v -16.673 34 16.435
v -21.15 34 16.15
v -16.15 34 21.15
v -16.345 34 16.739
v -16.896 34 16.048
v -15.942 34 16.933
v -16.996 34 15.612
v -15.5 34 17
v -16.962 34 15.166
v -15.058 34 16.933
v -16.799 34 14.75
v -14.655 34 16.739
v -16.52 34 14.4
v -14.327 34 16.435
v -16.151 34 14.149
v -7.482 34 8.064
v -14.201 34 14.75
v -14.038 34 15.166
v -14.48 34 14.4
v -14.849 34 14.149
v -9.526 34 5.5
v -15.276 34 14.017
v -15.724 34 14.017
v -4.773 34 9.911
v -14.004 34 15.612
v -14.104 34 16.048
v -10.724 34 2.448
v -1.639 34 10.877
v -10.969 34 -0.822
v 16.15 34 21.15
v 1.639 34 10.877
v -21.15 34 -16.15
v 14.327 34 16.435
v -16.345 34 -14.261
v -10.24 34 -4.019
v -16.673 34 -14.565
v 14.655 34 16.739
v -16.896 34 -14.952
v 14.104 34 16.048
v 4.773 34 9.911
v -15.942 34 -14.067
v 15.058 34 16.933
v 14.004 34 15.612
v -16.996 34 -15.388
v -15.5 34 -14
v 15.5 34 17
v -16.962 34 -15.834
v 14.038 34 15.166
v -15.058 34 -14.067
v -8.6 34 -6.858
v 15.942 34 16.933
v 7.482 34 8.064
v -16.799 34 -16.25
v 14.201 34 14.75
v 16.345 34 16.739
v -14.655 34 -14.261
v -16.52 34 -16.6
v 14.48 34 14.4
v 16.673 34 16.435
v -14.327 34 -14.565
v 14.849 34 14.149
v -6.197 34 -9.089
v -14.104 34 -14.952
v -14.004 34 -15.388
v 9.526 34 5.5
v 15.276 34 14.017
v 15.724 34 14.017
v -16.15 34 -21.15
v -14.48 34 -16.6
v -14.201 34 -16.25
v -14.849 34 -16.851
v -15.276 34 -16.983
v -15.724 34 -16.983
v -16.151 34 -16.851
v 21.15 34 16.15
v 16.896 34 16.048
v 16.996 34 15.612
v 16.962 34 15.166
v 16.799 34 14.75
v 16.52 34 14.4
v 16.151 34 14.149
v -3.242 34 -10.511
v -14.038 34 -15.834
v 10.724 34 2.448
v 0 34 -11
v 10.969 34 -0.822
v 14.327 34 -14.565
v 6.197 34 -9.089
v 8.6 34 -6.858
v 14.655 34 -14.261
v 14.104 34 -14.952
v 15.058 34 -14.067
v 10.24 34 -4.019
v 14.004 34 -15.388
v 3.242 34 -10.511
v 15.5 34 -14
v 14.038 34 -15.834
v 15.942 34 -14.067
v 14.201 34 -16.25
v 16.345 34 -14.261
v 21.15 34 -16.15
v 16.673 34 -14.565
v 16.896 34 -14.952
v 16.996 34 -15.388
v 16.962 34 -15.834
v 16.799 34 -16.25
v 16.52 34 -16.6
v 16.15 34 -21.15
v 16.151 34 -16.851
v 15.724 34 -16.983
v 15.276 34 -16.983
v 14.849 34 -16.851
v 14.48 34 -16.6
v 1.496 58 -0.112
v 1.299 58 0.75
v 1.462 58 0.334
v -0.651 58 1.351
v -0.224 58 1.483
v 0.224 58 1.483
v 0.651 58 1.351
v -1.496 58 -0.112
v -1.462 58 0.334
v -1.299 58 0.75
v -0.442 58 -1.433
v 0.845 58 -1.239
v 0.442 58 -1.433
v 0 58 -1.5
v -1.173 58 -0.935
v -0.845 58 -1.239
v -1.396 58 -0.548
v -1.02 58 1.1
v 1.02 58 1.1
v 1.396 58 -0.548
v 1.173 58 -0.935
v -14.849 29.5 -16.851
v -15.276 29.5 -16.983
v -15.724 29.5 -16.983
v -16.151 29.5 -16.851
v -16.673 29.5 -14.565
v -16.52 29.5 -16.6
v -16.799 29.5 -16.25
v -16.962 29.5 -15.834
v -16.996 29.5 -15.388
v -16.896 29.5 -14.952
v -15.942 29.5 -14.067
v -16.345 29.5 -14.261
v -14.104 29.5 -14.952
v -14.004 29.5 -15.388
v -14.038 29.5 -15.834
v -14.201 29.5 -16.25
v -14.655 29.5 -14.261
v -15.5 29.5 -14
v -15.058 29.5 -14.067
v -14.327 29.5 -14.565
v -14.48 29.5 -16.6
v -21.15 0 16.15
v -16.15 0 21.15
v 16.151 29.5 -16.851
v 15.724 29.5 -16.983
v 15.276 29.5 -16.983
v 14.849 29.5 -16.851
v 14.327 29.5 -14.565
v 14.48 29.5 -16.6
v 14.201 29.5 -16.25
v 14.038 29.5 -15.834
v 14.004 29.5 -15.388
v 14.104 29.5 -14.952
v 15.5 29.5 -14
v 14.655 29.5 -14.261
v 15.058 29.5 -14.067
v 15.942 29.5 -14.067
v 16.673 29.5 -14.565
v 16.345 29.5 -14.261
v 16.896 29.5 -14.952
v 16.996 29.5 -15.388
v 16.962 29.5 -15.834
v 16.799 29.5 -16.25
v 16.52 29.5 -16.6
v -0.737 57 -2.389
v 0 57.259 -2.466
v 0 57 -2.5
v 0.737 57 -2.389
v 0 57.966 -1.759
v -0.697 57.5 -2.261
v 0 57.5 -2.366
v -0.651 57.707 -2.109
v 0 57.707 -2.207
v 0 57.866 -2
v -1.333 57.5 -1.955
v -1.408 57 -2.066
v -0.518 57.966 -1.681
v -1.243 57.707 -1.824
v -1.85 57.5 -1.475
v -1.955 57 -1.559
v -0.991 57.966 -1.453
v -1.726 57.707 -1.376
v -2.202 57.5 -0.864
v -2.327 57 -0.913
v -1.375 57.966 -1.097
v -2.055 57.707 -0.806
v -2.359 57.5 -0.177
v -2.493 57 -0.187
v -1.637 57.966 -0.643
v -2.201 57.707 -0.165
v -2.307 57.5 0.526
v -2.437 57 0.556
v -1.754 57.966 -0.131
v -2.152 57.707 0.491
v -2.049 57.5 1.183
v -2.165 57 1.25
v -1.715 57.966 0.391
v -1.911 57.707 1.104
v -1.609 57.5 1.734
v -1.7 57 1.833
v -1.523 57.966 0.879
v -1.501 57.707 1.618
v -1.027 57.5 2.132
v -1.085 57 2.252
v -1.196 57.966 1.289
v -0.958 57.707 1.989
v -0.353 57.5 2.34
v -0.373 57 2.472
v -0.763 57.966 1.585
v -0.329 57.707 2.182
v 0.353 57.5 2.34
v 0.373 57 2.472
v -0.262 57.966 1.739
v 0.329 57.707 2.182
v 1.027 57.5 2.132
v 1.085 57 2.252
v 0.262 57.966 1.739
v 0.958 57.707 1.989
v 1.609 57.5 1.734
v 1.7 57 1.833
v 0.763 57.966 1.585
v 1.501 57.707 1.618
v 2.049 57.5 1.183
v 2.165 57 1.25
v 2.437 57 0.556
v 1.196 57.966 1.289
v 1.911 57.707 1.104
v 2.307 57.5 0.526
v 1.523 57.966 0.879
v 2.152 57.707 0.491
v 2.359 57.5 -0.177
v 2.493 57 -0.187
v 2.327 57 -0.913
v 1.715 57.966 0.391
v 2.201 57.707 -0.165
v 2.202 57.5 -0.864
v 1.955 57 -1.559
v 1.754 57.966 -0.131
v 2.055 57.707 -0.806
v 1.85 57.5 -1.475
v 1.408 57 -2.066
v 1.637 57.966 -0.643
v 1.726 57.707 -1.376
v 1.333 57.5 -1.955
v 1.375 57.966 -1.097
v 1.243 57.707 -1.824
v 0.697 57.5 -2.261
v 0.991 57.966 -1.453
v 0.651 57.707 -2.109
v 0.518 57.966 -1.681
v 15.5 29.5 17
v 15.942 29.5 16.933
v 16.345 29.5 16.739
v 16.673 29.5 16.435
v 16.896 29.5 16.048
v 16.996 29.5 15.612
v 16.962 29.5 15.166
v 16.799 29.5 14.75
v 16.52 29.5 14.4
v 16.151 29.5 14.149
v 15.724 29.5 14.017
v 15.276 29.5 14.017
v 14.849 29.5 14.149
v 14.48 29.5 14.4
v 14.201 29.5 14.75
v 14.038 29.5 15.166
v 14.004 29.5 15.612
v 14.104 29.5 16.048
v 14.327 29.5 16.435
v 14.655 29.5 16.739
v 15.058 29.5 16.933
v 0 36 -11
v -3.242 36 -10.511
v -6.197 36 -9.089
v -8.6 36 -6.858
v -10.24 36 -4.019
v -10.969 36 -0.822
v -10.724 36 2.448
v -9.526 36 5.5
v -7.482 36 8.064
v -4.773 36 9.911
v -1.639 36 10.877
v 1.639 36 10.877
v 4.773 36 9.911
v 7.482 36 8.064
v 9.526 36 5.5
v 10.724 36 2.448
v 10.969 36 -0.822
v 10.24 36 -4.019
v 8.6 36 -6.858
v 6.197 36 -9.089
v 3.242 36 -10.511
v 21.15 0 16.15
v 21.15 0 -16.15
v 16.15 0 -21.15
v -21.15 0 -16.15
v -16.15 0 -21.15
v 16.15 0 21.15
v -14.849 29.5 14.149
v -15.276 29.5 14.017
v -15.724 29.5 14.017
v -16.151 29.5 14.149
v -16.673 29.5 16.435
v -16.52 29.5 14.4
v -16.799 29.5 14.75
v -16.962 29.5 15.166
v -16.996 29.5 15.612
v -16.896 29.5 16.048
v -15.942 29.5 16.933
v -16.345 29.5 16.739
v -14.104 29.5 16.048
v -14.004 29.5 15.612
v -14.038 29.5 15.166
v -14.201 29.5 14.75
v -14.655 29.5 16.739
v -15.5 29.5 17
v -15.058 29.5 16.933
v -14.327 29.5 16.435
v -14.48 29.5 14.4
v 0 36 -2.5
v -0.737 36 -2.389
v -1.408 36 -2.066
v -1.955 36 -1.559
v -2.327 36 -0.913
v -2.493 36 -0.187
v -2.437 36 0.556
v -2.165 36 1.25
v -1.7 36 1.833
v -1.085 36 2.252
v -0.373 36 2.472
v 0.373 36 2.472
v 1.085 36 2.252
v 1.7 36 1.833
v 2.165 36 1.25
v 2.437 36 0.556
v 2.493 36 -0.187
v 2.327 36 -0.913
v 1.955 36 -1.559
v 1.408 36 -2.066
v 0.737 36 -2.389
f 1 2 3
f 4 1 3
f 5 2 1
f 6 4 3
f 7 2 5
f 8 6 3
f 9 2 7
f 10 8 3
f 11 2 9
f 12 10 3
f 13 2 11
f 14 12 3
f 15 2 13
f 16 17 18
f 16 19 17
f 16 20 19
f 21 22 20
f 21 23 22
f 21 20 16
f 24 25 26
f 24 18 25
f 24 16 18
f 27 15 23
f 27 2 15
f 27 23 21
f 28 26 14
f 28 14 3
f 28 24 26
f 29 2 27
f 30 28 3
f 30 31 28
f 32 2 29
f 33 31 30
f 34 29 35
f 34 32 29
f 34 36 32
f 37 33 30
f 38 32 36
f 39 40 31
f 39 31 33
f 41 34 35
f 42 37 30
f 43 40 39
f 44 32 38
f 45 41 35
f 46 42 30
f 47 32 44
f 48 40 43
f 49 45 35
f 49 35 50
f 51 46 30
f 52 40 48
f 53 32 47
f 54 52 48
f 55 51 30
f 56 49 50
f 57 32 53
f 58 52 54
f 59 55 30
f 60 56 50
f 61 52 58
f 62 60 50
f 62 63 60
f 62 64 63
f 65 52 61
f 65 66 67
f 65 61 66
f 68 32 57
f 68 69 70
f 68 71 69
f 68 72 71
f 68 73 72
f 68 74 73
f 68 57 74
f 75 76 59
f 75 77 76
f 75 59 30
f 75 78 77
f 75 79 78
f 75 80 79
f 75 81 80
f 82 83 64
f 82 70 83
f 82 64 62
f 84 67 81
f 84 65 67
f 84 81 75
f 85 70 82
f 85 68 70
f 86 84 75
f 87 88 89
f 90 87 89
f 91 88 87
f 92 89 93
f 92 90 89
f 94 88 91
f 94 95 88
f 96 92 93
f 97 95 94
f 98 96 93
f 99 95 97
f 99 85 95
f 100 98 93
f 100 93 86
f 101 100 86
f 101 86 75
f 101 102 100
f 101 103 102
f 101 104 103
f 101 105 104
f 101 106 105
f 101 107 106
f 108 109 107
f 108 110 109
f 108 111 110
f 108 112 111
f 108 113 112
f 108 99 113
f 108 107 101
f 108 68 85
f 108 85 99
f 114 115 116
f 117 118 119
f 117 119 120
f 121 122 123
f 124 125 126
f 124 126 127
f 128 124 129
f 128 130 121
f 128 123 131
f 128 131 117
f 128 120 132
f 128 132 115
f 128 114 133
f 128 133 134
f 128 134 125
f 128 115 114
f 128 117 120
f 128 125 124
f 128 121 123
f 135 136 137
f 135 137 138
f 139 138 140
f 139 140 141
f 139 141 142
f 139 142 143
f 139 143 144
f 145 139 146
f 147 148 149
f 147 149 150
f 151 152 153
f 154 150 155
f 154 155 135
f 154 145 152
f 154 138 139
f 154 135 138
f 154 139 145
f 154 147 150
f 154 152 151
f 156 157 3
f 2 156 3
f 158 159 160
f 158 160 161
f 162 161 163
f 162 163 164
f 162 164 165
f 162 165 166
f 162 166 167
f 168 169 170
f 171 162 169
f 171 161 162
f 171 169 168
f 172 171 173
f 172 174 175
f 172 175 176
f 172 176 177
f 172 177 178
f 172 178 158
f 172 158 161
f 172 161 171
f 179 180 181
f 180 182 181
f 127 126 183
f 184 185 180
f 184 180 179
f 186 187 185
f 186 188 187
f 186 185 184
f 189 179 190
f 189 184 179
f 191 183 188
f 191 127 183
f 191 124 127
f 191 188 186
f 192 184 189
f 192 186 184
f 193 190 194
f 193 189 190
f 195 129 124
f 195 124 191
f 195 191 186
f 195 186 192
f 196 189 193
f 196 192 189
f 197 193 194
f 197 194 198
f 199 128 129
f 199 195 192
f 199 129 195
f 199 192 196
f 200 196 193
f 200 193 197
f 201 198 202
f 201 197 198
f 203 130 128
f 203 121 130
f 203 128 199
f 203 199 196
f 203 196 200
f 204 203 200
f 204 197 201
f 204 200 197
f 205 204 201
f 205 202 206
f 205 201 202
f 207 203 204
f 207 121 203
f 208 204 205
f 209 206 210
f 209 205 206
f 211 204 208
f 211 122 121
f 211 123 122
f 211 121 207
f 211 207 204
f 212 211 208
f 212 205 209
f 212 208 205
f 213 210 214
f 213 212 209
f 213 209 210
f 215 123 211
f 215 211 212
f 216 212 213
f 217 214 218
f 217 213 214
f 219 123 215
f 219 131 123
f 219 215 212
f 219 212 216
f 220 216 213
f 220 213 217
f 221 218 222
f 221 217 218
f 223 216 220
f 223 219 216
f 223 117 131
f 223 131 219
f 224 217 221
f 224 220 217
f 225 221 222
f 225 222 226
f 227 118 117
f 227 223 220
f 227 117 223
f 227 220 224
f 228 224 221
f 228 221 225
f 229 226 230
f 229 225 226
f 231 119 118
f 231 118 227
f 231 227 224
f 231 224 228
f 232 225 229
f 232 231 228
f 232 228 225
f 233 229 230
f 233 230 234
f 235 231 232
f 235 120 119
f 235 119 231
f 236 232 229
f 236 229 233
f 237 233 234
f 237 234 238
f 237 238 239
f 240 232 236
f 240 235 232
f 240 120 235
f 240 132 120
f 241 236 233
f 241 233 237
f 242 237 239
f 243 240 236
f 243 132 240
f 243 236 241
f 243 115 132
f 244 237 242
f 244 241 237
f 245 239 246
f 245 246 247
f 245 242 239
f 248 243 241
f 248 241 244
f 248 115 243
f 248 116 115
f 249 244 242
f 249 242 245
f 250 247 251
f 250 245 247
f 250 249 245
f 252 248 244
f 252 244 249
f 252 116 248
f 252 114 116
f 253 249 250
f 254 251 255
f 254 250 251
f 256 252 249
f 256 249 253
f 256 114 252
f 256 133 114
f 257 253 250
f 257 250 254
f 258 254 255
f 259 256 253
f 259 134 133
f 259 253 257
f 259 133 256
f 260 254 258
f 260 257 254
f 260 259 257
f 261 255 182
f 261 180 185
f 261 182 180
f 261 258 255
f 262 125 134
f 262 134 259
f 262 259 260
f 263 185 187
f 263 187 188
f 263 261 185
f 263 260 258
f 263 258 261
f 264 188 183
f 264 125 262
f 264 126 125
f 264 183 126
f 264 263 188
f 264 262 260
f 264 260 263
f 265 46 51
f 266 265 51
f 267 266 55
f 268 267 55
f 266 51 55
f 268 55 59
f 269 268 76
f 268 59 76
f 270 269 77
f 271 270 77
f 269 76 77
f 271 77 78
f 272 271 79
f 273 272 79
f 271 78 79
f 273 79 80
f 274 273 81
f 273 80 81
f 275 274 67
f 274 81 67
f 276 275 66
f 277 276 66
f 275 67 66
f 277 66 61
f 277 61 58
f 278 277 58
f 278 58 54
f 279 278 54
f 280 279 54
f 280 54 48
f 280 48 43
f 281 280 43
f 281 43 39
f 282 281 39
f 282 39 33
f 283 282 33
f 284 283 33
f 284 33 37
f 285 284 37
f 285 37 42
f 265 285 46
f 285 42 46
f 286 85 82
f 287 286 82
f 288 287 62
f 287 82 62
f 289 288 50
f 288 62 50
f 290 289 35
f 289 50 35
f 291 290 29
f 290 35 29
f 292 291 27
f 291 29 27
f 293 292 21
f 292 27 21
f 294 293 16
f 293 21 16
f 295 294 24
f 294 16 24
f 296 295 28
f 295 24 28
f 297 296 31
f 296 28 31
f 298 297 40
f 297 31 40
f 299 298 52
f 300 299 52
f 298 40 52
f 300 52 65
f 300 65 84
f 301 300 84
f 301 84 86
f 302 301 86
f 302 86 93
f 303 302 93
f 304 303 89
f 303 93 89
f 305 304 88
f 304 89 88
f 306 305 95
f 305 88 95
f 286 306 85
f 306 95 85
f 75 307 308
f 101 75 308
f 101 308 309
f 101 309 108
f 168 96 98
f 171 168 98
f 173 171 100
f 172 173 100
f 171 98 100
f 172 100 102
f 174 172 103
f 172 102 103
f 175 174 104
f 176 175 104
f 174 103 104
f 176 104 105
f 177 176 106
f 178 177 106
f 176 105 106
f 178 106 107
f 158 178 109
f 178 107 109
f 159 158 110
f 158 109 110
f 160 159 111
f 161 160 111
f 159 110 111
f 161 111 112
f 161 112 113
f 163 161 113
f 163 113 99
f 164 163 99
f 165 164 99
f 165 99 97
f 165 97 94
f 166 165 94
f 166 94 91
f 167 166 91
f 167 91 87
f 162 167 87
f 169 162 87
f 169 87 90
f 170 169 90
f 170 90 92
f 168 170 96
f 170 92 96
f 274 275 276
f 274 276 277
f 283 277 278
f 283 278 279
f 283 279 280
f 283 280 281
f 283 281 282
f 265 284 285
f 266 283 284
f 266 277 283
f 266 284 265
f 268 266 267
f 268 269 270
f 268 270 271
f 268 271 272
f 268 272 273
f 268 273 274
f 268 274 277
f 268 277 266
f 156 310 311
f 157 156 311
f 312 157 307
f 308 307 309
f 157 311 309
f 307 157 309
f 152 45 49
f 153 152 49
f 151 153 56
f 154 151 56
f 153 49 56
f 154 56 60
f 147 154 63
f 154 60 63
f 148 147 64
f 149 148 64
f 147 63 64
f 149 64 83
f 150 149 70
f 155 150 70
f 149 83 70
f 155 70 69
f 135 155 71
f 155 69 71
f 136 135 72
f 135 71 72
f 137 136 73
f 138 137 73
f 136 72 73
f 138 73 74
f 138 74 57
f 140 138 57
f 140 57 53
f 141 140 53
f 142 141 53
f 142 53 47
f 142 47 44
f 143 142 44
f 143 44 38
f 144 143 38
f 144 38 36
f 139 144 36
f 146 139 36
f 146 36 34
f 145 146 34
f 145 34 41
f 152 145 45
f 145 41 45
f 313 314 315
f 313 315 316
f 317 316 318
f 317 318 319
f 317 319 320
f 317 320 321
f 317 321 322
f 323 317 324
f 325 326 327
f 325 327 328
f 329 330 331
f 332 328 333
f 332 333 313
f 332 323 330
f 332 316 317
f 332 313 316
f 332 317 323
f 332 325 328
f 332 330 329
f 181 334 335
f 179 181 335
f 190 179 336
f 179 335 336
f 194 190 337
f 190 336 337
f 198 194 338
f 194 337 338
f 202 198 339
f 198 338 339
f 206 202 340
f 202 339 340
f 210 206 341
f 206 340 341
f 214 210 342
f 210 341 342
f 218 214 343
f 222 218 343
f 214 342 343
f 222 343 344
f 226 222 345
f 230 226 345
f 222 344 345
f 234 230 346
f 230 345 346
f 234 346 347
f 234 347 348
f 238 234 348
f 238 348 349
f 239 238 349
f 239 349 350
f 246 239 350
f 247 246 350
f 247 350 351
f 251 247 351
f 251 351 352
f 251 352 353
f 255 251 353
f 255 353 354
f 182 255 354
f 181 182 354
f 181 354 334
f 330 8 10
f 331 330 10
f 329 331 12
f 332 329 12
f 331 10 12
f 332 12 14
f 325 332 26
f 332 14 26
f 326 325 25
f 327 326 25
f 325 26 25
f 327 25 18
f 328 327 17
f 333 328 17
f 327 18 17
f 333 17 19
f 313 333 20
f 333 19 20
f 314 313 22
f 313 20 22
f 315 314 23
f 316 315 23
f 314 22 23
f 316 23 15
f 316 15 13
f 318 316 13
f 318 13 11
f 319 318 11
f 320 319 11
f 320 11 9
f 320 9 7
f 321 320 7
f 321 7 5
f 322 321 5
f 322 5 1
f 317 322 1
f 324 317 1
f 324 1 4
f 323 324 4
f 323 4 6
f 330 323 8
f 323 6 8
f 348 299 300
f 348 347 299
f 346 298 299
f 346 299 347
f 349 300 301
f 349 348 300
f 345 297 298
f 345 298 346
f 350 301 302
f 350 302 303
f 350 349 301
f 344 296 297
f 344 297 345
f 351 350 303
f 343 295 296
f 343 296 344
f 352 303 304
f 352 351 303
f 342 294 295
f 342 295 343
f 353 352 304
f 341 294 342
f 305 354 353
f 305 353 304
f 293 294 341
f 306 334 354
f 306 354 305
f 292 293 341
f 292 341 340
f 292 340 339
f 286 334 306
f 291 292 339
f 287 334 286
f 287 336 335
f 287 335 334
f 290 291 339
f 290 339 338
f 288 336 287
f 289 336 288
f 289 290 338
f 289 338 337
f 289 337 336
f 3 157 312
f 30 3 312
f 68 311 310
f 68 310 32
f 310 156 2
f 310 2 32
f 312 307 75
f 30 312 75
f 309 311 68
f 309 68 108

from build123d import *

# Parameters (mm, degrees)
SKETCH1_W           = 42.3
SKETCH1_H           = 42.3
BOSS_EXTRUDE1_DEPTH = 34
SKETCH2_R           = 2.5
BOSS_EXTRUDE2_DEPTH = 24
SKETCH3_R           = 11
BOSS_EXTRUDE3_DEPTH = 2
SKETCH4_R           = 1.5
CUT_EXTRUDE1_DEPTH  = 4.5
CHAMFER1_SIZE       = 5
FILLET1_R           = 1


with BuildPart() as part:
    # Sketch1 → Boss-Extrude1 (new body)
    with BuildSketch(Plane(origin=(0, 0, 0), x_dir=(1, 0, 0), z_dir=(0, 1, 0))):
        Rectangle(SKETCH1_W, SKETCH1_H)
    extrude(amount=BOSS_EXTRUDE1_DEPTH)

    # Sketch2 → Boss-Extrude2 (add)
    with BuildSketch(Plane(origin=(0, 34, 0), x_dir=(1, 0, 0), z_dir=(0, 1, 0))):
        with Locations(Location((0, 0, 0), (0, 0, 90))):
            Circle(SKETCH2_R)
    extrude(amount=BOSS_EXTRUDE2_DEPTH)

    # Sketch3 → Boss-Extrude3 (add)
    with BuildSketch(Plane(origin=(0, 34, 0), x_dir=(1, 0, 0), z_dir=(0, 1, 0))):
        with Locations(Location((0, 0, 0), (0, 0, 90))):
            Circle(SKETCH3_R)
    extrude(amount=BOSS_EXTRUDE3_DEPTH)

    # Sketch4 → Cut-Extrude1 (cut)
    with BuildSketch(Plane(origin=(0, 34, 0), x_dir=(1, 0, 0), z_dir=(0, 1, 0))):
        with Locations(Location((-15.5, 15.5, 0), (0, 0, 270))):
            Circle(SKETCH4_R)
        with Locations(Location((15.5, 15.5, 0), (0, 0, 270))):
            Circle(SKETCH4_R)
        with Locations(Location((15.5, -15.5, 0), (0, 0, 270))):
            Circle(SKETCH4_R)
        with Locations(Location((-15.5, -15.5, 0), (0, 0, 270))):
            Circle(SKETCH4_R)
    extrude(amount=-CUT_EXTRUDE1_DEPTH, mode=Mode.SUBTRACT)

    # Chamfer1
    chamfer1_edges = [part.edges().sort_by_distance(p)[0] for p in [
        (21.15, 17, 21.15),
        (-21.15, 17, 21.15),
        (-21.15, 17, -21.15),
        (21.15, 17, -21.15),
    ]]
    chamfer(chamfer1_edges, length=CHAMFER1_SIZE)

    # Fillet1
    fillet1_edges = [part.edges().sort_by_distance(p)[0] for p in [
        (0, 58, 2.5),
    ]]
    fillet(fillet1_edges, radius=FILLET1_R)


solid = part.part
